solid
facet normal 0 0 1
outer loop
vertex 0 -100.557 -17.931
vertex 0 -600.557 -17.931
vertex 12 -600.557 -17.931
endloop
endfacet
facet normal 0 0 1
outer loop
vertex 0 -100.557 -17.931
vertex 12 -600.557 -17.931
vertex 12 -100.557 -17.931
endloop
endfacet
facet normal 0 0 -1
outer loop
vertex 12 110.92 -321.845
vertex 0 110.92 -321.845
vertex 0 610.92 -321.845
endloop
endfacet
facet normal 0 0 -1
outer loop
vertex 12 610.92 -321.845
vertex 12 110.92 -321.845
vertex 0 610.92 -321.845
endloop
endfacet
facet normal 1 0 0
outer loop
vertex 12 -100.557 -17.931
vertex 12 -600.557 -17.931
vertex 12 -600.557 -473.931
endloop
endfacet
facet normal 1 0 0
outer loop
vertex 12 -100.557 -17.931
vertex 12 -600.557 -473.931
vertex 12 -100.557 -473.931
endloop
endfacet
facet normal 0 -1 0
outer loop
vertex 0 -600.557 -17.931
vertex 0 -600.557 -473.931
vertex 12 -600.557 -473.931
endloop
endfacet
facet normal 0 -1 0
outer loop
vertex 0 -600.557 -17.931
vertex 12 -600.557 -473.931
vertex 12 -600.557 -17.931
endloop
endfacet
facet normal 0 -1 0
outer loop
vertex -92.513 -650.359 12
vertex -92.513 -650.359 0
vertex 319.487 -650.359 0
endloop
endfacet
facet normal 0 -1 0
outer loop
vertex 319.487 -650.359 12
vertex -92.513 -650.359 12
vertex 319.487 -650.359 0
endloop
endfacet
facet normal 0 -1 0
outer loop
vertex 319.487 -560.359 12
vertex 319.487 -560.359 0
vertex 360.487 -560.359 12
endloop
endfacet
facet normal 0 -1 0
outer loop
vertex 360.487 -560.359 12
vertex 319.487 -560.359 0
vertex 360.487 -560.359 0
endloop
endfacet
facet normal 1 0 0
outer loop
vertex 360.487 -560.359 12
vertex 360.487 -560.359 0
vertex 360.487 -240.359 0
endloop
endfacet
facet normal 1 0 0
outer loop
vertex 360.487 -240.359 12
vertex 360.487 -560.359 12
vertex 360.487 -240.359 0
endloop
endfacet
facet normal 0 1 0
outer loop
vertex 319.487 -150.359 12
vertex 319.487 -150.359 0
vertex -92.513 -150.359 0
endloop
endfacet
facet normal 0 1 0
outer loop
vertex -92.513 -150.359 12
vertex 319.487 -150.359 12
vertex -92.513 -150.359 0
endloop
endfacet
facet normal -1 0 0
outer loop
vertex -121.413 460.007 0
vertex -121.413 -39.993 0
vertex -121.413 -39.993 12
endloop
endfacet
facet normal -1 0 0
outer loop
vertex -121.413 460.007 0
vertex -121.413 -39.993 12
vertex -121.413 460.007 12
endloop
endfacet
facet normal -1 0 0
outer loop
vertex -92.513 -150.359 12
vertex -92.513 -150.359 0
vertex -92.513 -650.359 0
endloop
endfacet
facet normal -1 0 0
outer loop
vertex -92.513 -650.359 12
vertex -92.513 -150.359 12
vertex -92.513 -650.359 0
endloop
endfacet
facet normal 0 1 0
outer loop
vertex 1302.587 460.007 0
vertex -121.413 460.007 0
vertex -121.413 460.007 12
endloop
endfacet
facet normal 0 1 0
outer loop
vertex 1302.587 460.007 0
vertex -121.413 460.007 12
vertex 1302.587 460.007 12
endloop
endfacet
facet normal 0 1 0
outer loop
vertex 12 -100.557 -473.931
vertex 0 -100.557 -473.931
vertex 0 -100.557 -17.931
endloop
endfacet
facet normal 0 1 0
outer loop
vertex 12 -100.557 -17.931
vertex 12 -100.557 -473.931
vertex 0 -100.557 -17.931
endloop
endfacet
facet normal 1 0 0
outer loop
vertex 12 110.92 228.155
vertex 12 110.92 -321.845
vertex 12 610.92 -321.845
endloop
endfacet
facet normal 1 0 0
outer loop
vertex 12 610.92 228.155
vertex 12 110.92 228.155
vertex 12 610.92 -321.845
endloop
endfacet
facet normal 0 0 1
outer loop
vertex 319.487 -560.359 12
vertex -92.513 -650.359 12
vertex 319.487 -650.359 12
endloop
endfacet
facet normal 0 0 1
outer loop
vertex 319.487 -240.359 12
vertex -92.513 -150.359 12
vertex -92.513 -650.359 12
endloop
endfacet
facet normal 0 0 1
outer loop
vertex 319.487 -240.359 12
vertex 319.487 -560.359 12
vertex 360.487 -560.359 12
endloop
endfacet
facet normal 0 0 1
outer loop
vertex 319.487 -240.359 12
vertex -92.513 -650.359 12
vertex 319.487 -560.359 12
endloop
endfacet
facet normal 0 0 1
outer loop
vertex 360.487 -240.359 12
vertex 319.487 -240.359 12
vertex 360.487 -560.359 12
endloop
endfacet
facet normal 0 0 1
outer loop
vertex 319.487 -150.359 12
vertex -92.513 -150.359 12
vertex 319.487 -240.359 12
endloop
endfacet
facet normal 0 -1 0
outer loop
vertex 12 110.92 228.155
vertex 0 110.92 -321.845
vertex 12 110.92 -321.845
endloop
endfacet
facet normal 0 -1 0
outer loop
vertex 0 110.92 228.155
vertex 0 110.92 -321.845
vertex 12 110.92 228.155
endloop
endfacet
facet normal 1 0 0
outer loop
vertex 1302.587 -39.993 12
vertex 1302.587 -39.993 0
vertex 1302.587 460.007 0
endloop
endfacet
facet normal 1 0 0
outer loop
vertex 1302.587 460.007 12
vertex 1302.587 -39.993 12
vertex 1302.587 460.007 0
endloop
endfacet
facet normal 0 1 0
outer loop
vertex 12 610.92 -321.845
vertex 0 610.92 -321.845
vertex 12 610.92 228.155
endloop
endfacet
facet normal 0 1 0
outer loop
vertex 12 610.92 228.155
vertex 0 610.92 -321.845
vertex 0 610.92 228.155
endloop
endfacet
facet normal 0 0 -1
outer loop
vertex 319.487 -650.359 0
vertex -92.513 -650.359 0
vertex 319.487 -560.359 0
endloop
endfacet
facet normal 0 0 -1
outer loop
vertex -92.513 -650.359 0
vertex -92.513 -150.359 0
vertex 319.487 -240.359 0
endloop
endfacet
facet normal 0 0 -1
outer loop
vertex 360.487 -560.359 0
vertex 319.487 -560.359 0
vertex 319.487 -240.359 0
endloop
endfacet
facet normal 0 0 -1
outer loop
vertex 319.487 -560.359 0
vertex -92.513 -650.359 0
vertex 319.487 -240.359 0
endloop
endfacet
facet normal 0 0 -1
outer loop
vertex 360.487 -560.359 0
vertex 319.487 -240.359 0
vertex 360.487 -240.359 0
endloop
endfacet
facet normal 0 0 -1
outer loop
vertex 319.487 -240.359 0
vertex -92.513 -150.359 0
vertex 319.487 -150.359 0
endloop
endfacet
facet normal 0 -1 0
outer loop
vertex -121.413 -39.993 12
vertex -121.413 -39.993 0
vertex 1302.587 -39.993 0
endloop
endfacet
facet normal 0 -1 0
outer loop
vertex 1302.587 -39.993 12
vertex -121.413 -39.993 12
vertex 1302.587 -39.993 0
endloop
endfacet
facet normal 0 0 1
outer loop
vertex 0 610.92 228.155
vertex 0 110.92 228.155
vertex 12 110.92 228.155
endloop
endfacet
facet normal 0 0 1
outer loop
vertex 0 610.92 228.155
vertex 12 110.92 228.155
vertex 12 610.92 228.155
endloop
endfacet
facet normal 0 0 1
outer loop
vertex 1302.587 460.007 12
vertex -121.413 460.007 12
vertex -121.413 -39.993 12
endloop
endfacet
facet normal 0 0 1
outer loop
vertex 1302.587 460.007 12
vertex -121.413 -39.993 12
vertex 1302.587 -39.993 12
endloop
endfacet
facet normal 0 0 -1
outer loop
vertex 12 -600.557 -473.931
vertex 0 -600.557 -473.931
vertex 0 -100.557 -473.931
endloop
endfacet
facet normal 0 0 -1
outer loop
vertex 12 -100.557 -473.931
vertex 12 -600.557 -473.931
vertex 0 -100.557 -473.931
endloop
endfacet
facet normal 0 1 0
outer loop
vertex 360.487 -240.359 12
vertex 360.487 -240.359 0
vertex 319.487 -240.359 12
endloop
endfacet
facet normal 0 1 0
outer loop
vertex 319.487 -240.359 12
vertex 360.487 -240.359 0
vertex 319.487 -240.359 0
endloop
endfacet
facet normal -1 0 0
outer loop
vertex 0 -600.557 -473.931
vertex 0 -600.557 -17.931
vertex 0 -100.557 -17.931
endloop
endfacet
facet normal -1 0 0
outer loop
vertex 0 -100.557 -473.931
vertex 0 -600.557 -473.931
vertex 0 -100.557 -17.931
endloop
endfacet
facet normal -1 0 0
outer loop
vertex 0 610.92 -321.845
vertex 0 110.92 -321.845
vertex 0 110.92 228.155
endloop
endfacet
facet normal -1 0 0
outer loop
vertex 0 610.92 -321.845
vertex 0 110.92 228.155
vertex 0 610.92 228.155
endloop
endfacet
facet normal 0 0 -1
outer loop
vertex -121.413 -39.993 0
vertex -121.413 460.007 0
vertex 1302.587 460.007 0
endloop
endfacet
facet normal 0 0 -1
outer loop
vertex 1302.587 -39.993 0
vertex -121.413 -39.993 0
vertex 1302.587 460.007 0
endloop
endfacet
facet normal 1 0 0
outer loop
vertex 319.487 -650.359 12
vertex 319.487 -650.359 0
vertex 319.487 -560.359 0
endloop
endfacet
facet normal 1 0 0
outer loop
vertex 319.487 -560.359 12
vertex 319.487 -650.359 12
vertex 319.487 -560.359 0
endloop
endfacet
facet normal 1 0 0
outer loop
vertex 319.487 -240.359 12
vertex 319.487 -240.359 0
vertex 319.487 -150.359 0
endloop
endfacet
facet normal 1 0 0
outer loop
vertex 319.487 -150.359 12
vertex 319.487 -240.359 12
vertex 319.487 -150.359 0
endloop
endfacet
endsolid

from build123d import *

# Parameters (mm, degrees)
F0_W     = 1424
F0_H     = 500
F1_DEPTH = 12
F2_W     = 500
F2_H     = 550
F3_DEPTH = 12
F5_DEPTH = 12
F6_W     = 500
F6_H     = 456
F7_DEPTH = 12


with BuildPart() as f1:
    # F0 (on Top) → F1 (new body)
    with BuildSketch(Plane.XY):
        with Locations((590.587484, 210.007116)):
            Rectangle(F0_W, F0_H)
    extrude(amount=F1_DEPTH)


with BuildPart() as f3:
    # F2 (on Right) → F3 (new body)
    with BuildSketch(Plane.YZ):
        with Locations((360.920265, -46.844786)):
            Rectangle(F2_W, F2_H)
    extrude(amount=F3_DEPTH)


with BuildPart() as f5:
    # F4 (on Top) → F5 (new body)
    with BuildSketch(Plane.XY):
        Polygon((319.487002, -150.359154), (-92.512998, -150.359154), (-92.512998, -650.359154), (319.487002, -650.359154), (319.487002, -560.359154), (360.487002, -560.359154), (360.487002, -240.359154), (319.487002, -240.359154), align=None)
    extrude(amount=F5_DEPTH)


with BuildPart() as f7:
    # F6 (on Right) → F7 (new body)
    with BuildSketch(Plane.YZ):
        with Locations((-350.556731, -245.931283)):
            Rectangle(F6_W, F6_H)
    extrude(amount=F7_DEPTH)


solid = Compound([f1.part, f3.part, f5.part, f7.part])
